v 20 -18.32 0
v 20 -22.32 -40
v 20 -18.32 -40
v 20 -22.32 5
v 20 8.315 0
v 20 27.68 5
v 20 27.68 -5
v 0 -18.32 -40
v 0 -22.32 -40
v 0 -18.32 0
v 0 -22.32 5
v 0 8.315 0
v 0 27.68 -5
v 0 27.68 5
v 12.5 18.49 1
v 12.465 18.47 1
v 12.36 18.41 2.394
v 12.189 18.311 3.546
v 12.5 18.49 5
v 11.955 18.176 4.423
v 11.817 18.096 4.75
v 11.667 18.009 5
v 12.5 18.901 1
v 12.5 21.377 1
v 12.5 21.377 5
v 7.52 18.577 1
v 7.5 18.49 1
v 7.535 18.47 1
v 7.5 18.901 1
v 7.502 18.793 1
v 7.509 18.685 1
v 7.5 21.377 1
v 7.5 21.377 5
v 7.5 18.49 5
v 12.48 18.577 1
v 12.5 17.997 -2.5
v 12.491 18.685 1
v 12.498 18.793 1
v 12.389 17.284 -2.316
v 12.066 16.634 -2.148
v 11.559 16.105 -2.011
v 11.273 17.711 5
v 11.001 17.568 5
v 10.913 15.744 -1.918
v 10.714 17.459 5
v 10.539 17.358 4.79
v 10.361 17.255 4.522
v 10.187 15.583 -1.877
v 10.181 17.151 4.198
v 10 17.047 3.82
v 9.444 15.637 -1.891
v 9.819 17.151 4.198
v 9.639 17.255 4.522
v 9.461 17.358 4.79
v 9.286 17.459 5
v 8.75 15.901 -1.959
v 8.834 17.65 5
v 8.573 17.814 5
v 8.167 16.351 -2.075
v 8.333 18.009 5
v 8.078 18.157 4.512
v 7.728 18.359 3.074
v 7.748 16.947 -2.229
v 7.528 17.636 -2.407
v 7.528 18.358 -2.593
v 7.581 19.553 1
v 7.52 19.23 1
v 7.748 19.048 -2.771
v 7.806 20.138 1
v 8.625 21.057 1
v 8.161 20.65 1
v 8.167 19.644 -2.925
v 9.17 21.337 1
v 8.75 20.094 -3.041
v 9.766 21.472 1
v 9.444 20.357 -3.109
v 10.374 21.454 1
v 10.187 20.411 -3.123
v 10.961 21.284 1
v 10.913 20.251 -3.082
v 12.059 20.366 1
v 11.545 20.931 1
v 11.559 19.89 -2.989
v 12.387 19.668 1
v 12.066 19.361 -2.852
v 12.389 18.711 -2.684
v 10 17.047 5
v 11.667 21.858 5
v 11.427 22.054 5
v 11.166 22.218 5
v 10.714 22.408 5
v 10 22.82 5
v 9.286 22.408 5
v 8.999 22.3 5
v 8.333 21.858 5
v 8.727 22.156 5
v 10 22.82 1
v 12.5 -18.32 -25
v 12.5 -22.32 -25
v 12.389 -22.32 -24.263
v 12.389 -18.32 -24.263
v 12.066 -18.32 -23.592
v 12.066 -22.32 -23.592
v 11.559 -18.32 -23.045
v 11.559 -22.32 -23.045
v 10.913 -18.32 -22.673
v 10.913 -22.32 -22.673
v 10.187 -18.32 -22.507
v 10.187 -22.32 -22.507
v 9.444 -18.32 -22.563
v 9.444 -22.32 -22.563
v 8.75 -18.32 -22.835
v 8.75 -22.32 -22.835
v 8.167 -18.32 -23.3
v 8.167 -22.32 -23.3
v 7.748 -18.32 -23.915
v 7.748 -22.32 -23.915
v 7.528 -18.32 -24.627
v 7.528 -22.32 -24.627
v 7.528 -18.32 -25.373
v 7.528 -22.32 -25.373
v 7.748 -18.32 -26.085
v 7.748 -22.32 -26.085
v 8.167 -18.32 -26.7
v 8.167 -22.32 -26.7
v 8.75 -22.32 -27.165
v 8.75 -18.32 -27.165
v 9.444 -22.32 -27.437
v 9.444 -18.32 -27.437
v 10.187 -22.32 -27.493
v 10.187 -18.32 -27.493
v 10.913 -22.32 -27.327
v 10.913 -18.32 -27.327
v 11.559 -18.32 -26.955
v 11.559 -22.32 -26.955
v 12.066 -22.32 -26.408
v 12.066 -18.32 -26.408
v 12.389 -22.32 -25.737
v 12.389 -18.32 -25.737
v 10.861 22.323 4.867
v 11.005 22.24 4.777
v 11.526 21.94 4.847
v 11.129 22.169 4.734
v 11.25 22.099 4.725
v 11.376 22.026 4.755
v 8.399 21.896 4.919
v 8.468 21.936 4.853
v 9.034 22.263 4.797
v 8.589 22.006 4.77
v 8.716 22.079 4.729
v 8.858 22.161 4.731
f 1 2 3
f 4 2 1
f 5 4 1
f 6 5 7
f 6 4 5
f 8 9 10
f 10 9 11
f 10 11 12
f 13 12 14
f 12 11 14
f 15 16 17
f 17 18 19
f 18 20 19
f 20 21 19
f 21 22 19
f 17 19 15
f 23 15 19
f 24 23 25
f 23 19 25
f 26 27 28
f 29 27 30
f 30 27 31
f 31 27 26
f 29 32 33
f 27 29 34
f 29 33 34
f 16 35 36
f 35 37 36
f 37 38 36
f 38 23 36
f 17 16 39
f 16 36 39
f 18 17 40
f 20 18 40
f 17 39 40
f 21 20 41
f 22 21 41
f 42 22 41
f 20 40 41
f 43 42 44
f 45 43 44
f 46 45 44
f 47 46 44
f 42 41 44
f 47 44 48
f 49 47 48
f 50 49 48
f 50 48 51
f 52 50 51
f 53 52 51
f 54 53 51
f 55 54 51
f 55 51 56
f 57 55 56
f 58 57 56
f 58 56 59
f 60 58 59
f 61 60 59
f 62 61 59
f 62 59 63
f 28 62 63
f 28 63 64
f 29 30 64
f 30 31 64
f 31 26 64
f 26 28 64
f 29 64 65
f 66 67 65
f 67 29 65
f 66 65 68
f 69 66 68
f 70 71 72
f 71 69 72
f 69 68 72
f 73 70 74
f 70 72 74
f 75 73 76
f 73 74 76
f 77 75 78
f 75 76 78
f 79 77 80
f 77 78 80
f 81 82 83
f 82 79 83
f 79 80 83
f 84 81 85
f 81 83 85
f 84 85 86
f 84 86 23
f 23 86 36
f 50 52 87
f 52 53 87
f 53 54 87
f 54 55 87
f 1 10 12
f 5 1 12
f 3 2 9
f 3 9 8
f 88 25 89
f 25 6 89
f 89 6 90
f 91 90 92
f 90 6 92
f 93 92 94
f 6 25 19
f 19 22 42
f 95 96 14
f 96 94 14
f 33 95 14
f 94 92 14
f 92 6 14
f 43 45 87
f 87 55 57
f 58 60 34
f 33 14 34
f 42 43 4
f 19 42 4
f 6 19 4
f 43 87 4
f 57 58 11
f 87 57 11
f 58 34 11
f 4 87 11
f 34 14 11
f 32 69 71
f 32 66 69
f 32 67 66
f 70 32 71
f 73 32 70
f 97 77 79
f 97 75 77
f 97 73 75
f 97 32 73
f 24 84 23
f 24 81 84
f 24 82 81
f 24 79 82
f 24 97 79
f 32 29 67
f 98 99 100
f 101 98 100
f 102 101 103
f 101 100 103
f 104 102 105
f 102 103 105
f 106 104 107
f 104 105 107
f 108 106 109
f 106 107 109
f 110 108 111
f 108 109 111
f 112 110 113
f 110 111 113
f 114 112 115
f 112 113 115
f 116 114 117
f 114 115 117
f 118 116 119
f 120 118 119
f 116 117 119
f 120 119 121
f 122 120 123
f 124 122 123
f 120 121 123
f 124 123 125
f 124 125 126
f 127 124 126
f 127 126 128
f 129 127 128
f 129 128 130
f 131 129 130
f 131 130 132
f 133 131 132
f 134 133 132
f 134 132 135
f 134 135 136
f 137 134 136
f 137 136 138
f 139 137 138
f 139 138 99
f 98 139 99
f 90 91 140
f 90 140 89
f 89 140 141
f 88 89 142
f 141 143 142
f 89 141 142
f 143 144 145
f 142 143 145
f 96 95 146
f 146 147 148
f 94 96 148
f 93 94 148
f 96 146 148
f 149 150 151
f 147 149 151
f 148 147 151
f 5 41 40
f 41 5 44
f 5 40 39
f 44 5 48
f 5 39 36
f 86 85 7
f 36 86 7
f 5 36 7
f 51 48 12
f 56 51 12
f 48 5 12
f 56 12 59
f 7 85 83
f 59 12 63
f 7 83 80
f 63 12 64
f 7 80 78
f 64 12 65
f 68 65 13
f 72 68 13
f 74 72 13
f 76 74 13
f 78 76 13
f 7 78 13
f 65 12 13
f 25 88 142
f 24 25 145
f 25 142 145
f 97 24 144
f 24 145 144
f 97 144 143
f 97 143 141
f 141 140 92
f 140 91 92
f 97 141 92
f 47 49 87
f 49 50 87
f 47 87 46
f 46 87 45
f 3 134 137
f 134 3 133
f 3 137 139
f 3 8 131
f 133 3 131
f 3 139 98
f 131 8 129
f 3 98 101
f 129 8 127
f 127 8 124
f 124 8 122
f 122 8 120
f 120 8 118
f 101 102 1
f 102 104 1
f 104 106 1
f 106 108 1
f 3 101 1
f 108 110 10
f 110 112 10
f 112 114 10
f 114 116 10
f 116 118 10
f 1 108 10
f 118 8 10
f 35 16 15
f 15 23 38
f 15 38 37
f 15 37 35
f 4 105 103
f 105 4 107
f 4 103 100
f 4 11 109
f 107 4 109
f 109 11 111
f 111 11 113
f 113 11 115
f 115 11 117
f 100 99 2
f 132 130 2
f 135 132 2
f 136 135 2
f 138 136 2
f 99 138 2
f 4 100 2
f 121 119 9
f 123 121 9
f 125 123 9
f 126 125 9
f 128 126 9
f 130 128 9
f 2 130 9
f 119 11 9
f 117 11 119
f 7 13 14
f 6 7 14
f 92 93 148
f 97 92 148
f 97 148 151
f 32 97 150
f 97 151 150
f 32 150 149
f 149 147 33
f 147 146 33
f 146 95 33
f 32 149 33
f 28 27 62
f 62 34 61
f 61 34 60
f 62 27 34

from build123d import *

# Parameters (mm, degrees)
F0_W     = 4
F0_H     = 40
F1_DEPTH = 20
F2_R     = 2.5
F3_DEPTH = 5
F4_R     = 2.5
F5_DEPTH = 10
F7_DEPTH = 4


with BuildPart() as f1:
    # F0 (on Right) → F1 (new body)
    with BuildSketch(Plane.YZ):
        Polygon((27.6797143764, -5), (27.6797143764, 0), (8.3147976454, 0), align=None)
        Polygon((8.3147976454, 0), (27.6797143764, 0), (27.6797143764, 5), (-22.3202856236, 5), (-22.3202856236, 0), (-18.3202856236, 0), align=None)
        with Locations((-20.3202856236, -20)):
            Rectangle(F0_W, F0_H)
    extrude(amount=F1_DEPTH)

    # F2 (on face) → F3 (cut)
    with BuildSketch(Plane.XZ.offset(22.3202856236)):
        with Locations((10, -25)):
            Circle(F2_R)
    extrude(amount=-F3_DEPTH, mode=Mode.SUBTRACT)

    # F4 (on face) → F5 (cut)
    with BuildSketch(Plane(origin=(0, 0.5196748528, 2.0126920505), x_dir=(1, 0, 0), z_dir=(0, -0.25, -0.9682458366))):
        with Locations((10, -18.0507682019)):
            Circle(F4_R)
    extrude(amount=-F5_DEPTH, mode=Mode.SUBTRACT)

    # F6 (on face) → F7 (cut)
    with BuildSketch(Plane.XY.offset(5)):
        Polygon((12.5, 18.4903720111), (12.5, 21.377123357), (10, 22.82049903), (7.5, 21.377123357), (7.5, 18.4903720111), (10, 17.0469963381), align=None)
    extrude(amount=-F7_DEPTH, mode=Mode.SUBTRACT)


solid = f1.part
